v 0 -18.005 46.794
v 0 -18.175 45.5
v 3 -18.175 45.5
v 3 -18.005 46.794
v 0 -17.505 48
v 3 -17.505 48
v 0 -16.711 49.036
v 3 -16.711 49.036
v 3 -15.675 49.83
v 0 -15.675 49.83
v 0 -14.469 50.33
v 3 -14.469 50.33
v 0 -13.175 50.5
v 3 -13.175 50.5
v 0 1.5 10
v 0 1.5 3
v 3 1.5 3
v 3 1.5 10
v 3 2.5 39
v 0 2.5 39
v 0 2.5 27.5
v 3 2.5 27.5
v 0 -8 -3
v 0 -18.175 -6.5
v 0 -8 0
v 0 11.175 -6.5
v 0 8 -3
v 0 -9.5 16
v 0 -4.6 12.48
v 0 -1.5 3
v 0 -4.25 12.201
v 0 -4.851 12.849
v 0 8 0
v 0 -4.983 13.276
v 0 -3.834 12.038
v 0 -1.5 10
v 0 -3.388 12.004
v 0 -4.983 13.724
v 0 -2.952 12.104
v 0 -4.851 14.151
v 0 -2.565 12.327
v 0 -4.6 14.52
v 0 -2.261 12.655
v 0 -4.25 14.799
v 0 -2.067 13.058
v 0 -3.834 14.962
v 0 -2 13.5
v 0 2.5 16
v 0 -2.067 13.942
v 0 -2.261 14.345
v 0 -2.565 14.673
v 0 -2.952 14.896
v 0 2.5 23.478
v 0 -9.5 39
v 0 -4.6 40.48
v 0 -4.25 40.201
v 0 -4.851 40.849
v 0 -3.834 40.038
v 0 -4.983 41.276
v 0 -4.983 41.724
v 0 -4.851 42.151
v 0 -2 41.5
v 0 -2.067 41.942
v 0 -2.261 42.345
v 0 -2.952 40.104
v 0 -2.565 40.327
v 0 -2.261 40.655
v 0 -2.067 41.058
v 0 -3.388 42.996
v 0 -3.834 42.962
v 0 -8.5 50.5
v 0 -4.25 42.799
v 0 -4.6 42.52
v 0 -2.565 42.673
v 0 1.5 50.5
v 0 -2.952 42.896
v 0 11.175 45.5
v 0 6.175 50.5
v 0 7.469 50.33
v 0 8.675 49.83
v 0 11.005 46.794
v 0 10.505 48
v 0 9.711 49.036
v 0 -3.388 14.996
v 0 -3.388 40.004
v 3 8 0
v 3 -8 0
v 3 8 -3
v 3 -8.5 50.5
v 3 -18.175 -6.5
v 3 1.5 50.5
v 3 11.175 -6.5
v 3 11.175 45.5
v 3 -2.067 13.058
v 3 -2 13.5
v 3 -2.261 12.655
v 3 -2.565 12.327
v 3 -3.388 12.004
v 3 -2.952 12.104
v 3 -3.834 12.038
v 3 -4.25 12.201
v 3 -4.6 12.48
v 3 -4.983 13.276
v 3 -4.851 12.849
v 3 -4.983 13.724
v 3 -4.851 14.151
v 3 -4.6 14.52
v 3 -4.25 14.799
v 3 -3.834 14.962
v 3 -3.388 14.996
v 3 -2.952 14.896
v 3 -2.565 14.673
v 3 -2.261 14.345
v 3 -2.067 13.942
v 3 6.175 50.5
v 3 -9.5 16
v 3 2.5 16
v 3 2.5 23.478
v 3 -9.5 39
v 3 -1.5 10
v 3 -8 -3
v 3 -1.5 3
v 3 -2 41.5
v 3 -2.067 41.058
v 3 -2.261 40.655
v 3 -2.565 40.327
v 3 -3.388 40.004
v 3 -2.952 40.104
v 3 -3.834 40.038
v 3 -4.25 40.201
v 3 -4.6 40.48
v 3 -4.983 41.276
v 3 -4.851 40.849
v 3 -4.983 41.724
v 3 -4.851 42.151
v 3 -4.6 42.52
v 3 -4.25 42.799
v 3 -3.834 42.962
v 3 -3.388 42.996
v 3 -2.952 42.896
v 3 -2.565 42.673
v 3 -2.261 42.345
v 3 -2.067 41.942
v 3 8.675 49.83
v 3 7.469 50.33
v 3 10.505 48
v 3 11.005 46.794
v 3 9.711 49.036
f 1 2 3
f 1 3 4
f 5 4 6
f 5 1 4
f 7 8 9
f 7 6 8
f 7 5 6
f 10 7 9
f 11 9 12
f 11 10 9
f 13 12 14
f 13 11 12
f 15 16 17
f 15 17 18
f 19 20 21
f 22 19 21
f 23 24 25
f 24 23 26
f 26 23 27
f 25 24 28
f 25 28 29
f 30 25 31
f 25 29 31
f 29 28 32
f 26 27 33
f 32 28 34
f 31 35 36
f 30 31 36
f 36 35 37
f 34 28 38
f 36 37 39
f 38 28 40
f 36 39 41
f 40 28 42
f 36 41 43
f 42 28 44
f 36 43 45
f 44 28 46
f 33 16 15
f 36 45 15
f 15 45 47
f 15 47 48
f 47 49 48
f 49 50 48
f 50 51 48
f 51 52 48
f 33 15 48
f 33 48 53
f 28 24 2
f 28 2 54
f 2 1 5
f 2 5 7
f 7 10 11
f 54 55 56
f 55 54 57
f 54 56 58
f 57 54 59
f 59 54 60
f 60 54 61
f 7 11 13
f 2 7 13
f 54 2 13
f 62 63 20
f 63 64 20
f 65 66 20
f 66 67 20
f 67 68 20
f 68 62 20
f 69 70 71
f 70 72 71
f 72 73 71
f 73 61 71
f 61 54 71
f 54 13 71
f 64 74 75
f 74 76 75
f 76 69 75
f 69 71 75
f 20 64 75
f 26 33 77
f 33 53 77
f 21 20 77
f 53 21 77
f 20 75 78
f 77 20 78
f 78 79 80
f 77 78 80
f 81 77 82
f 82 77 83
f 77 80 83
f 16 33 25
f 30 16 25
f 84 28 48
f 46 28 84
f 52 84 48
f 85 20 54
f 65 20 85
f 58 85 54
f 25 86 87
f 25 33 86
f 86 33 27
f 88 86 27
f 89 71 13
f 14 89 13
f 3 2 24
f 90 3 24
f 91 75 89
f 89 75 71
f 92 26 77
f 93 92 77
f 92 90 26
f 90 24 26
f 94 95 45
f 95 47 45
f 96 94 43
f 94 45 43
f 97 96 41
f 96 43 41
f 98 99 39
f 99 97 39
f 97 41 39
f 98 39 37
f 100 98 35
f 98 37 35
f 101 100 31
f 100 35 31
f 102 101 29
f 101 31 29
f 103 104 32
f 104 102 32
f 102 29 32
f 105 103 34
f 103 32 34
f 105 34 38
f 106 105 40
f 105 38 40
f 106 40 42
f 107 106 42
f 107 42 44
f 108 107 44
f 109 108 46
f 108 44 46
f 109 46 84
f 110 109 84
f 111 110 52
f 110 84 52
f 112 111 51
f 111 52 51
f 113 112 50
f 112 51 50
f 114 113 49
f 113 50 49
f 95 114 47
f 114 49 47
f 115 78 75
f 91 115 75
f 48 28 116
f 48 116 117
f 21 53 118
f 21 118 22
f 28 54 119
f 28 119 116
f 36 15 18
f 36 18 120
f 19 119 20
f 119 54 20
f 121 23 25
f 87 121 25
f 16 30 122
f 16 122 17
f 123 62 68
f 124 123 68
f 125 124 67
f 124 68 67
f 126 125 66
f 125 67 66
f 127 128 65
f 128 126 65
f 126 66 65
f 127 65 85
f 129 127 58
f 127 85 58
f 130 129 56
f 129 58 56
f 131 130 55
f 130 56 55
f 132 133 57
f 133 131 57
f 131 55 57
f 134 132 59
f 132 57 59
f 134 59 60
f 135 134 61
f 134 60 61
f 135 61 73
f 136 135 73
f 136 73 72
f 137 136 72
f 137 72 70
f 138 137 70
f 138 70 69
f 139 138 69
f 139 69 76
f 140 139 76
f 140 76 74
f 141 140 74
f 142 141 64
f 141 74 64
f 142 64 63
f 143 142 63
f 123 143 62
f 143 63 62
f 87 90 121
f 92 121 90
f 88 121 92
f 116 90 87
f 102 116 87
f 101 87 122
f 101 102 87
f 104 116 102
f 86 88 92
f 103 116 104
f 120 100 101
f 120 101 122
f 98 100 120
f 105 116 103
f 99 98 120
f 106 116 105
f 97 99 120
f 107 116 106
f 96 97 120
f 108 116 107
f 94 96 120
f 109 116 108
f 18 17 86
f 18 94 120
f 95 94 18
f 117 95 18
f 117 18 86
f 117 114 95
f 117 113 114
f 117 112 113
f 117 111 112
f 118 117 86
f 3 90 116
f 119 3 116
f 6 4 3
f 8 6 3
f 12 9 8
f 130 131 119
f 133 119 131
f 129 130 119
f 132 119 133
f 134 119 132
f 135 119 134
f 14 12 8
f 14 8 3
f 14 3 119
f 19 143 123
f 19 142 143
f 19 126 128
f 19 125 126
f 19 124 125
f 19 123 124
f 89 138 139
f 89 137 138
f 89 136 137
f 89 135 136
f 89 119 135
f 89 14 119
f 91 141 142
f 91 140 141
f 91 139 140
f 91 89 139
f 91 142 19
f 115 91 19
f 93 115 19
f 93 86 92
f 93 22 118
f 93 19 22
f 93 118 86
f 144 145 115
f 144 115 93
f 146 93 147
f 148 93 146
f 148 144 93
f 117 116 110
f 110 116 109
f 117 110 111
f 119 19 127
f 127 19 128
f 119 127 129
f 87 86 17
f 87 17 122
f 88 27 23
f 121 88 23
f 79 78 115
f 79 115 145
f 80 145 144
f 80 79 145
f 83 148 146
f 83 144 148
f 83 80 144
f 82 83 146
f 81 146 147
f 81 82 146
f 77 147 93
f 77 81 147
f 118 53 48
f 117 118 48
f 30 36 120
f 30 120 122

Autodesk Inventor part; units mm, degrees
ref_plane "YZ Plane" through (0, 0, 0) normal (1, 0, 0) x (0, 1, 0)
ref_plane "XZ Plane" through (0, 0, 0) normal (0, 1, 0) x (-1, 0, 0)
ref_plane "XY Plane" through (0, 0, 0) normal (0, 0, 1) x (1, 0, 0)
sketch "Boceto1" plane through (0, 0, 0) normal (1, 0, 0) x (0, 1, 0)
  line L0 (8, 0) -> (8, -3)
  line L1 (8, -3) -> (-8, -3)
  line L2 (-8, -3) -> (-8, 0)
  line L3 (8, 0) -> (-8, 0)
  line L4 (-18.175, -6.5) -> (11.175, -6.5)
  line L5 (1.5, 3) -> (1.5, 10)
  line L6 (1.5, 10) -> (-1.5, 10)
  line L7 (-1.5, 10) -> (-1.5, 3)
  line L8 (-1.5, 3) -> (1.5, 3)
  line L9 (-9.5, 39) -> (2.5, 39)
  line L10 (2.5, 39) -> (2.5, 16)
  line L11 (-9.5, 39) -> (-9.5, 16)
  line L12 (-9.5, 16) -> (2.5, 16)
  circle A0 centre (-3.5, 41.5) radius 1.5
  circle A1 centre (-3.5, 13.5) radius 1.5
  line L13 (11.175, -6.5) -> (11.175, 45.5)
  line L14 (-18.175, 45.5) -> (-18.175, -6.5)
  line L15 (2.5, 23.4783) -> (2.5, 27.5)
  line L16 (6.175, 50.5) -> (1.5, 50.5)
  line L17 (-8.5, 50.5) -> (-13.175, 50.5)
  line L18 (1.5, 50.5) -> (-8.5, 50.5)
  arc A2 (-13.175, 50.5) -> (-18.175, 45.5) centre (-13.175, 45.5) ccw
  arc A3 (11.175, 45.5) -> (6.175, 50.5) centre (6.175, 45.5) ccw
  point P0 (11.175, 50.5)
  point P1 (-18.175, 50.5)
  dimension "d28" = 5
extrude "Extrusión1" add sketch "Boceto1" along normal blind 3
properties part number "muñeca5"
